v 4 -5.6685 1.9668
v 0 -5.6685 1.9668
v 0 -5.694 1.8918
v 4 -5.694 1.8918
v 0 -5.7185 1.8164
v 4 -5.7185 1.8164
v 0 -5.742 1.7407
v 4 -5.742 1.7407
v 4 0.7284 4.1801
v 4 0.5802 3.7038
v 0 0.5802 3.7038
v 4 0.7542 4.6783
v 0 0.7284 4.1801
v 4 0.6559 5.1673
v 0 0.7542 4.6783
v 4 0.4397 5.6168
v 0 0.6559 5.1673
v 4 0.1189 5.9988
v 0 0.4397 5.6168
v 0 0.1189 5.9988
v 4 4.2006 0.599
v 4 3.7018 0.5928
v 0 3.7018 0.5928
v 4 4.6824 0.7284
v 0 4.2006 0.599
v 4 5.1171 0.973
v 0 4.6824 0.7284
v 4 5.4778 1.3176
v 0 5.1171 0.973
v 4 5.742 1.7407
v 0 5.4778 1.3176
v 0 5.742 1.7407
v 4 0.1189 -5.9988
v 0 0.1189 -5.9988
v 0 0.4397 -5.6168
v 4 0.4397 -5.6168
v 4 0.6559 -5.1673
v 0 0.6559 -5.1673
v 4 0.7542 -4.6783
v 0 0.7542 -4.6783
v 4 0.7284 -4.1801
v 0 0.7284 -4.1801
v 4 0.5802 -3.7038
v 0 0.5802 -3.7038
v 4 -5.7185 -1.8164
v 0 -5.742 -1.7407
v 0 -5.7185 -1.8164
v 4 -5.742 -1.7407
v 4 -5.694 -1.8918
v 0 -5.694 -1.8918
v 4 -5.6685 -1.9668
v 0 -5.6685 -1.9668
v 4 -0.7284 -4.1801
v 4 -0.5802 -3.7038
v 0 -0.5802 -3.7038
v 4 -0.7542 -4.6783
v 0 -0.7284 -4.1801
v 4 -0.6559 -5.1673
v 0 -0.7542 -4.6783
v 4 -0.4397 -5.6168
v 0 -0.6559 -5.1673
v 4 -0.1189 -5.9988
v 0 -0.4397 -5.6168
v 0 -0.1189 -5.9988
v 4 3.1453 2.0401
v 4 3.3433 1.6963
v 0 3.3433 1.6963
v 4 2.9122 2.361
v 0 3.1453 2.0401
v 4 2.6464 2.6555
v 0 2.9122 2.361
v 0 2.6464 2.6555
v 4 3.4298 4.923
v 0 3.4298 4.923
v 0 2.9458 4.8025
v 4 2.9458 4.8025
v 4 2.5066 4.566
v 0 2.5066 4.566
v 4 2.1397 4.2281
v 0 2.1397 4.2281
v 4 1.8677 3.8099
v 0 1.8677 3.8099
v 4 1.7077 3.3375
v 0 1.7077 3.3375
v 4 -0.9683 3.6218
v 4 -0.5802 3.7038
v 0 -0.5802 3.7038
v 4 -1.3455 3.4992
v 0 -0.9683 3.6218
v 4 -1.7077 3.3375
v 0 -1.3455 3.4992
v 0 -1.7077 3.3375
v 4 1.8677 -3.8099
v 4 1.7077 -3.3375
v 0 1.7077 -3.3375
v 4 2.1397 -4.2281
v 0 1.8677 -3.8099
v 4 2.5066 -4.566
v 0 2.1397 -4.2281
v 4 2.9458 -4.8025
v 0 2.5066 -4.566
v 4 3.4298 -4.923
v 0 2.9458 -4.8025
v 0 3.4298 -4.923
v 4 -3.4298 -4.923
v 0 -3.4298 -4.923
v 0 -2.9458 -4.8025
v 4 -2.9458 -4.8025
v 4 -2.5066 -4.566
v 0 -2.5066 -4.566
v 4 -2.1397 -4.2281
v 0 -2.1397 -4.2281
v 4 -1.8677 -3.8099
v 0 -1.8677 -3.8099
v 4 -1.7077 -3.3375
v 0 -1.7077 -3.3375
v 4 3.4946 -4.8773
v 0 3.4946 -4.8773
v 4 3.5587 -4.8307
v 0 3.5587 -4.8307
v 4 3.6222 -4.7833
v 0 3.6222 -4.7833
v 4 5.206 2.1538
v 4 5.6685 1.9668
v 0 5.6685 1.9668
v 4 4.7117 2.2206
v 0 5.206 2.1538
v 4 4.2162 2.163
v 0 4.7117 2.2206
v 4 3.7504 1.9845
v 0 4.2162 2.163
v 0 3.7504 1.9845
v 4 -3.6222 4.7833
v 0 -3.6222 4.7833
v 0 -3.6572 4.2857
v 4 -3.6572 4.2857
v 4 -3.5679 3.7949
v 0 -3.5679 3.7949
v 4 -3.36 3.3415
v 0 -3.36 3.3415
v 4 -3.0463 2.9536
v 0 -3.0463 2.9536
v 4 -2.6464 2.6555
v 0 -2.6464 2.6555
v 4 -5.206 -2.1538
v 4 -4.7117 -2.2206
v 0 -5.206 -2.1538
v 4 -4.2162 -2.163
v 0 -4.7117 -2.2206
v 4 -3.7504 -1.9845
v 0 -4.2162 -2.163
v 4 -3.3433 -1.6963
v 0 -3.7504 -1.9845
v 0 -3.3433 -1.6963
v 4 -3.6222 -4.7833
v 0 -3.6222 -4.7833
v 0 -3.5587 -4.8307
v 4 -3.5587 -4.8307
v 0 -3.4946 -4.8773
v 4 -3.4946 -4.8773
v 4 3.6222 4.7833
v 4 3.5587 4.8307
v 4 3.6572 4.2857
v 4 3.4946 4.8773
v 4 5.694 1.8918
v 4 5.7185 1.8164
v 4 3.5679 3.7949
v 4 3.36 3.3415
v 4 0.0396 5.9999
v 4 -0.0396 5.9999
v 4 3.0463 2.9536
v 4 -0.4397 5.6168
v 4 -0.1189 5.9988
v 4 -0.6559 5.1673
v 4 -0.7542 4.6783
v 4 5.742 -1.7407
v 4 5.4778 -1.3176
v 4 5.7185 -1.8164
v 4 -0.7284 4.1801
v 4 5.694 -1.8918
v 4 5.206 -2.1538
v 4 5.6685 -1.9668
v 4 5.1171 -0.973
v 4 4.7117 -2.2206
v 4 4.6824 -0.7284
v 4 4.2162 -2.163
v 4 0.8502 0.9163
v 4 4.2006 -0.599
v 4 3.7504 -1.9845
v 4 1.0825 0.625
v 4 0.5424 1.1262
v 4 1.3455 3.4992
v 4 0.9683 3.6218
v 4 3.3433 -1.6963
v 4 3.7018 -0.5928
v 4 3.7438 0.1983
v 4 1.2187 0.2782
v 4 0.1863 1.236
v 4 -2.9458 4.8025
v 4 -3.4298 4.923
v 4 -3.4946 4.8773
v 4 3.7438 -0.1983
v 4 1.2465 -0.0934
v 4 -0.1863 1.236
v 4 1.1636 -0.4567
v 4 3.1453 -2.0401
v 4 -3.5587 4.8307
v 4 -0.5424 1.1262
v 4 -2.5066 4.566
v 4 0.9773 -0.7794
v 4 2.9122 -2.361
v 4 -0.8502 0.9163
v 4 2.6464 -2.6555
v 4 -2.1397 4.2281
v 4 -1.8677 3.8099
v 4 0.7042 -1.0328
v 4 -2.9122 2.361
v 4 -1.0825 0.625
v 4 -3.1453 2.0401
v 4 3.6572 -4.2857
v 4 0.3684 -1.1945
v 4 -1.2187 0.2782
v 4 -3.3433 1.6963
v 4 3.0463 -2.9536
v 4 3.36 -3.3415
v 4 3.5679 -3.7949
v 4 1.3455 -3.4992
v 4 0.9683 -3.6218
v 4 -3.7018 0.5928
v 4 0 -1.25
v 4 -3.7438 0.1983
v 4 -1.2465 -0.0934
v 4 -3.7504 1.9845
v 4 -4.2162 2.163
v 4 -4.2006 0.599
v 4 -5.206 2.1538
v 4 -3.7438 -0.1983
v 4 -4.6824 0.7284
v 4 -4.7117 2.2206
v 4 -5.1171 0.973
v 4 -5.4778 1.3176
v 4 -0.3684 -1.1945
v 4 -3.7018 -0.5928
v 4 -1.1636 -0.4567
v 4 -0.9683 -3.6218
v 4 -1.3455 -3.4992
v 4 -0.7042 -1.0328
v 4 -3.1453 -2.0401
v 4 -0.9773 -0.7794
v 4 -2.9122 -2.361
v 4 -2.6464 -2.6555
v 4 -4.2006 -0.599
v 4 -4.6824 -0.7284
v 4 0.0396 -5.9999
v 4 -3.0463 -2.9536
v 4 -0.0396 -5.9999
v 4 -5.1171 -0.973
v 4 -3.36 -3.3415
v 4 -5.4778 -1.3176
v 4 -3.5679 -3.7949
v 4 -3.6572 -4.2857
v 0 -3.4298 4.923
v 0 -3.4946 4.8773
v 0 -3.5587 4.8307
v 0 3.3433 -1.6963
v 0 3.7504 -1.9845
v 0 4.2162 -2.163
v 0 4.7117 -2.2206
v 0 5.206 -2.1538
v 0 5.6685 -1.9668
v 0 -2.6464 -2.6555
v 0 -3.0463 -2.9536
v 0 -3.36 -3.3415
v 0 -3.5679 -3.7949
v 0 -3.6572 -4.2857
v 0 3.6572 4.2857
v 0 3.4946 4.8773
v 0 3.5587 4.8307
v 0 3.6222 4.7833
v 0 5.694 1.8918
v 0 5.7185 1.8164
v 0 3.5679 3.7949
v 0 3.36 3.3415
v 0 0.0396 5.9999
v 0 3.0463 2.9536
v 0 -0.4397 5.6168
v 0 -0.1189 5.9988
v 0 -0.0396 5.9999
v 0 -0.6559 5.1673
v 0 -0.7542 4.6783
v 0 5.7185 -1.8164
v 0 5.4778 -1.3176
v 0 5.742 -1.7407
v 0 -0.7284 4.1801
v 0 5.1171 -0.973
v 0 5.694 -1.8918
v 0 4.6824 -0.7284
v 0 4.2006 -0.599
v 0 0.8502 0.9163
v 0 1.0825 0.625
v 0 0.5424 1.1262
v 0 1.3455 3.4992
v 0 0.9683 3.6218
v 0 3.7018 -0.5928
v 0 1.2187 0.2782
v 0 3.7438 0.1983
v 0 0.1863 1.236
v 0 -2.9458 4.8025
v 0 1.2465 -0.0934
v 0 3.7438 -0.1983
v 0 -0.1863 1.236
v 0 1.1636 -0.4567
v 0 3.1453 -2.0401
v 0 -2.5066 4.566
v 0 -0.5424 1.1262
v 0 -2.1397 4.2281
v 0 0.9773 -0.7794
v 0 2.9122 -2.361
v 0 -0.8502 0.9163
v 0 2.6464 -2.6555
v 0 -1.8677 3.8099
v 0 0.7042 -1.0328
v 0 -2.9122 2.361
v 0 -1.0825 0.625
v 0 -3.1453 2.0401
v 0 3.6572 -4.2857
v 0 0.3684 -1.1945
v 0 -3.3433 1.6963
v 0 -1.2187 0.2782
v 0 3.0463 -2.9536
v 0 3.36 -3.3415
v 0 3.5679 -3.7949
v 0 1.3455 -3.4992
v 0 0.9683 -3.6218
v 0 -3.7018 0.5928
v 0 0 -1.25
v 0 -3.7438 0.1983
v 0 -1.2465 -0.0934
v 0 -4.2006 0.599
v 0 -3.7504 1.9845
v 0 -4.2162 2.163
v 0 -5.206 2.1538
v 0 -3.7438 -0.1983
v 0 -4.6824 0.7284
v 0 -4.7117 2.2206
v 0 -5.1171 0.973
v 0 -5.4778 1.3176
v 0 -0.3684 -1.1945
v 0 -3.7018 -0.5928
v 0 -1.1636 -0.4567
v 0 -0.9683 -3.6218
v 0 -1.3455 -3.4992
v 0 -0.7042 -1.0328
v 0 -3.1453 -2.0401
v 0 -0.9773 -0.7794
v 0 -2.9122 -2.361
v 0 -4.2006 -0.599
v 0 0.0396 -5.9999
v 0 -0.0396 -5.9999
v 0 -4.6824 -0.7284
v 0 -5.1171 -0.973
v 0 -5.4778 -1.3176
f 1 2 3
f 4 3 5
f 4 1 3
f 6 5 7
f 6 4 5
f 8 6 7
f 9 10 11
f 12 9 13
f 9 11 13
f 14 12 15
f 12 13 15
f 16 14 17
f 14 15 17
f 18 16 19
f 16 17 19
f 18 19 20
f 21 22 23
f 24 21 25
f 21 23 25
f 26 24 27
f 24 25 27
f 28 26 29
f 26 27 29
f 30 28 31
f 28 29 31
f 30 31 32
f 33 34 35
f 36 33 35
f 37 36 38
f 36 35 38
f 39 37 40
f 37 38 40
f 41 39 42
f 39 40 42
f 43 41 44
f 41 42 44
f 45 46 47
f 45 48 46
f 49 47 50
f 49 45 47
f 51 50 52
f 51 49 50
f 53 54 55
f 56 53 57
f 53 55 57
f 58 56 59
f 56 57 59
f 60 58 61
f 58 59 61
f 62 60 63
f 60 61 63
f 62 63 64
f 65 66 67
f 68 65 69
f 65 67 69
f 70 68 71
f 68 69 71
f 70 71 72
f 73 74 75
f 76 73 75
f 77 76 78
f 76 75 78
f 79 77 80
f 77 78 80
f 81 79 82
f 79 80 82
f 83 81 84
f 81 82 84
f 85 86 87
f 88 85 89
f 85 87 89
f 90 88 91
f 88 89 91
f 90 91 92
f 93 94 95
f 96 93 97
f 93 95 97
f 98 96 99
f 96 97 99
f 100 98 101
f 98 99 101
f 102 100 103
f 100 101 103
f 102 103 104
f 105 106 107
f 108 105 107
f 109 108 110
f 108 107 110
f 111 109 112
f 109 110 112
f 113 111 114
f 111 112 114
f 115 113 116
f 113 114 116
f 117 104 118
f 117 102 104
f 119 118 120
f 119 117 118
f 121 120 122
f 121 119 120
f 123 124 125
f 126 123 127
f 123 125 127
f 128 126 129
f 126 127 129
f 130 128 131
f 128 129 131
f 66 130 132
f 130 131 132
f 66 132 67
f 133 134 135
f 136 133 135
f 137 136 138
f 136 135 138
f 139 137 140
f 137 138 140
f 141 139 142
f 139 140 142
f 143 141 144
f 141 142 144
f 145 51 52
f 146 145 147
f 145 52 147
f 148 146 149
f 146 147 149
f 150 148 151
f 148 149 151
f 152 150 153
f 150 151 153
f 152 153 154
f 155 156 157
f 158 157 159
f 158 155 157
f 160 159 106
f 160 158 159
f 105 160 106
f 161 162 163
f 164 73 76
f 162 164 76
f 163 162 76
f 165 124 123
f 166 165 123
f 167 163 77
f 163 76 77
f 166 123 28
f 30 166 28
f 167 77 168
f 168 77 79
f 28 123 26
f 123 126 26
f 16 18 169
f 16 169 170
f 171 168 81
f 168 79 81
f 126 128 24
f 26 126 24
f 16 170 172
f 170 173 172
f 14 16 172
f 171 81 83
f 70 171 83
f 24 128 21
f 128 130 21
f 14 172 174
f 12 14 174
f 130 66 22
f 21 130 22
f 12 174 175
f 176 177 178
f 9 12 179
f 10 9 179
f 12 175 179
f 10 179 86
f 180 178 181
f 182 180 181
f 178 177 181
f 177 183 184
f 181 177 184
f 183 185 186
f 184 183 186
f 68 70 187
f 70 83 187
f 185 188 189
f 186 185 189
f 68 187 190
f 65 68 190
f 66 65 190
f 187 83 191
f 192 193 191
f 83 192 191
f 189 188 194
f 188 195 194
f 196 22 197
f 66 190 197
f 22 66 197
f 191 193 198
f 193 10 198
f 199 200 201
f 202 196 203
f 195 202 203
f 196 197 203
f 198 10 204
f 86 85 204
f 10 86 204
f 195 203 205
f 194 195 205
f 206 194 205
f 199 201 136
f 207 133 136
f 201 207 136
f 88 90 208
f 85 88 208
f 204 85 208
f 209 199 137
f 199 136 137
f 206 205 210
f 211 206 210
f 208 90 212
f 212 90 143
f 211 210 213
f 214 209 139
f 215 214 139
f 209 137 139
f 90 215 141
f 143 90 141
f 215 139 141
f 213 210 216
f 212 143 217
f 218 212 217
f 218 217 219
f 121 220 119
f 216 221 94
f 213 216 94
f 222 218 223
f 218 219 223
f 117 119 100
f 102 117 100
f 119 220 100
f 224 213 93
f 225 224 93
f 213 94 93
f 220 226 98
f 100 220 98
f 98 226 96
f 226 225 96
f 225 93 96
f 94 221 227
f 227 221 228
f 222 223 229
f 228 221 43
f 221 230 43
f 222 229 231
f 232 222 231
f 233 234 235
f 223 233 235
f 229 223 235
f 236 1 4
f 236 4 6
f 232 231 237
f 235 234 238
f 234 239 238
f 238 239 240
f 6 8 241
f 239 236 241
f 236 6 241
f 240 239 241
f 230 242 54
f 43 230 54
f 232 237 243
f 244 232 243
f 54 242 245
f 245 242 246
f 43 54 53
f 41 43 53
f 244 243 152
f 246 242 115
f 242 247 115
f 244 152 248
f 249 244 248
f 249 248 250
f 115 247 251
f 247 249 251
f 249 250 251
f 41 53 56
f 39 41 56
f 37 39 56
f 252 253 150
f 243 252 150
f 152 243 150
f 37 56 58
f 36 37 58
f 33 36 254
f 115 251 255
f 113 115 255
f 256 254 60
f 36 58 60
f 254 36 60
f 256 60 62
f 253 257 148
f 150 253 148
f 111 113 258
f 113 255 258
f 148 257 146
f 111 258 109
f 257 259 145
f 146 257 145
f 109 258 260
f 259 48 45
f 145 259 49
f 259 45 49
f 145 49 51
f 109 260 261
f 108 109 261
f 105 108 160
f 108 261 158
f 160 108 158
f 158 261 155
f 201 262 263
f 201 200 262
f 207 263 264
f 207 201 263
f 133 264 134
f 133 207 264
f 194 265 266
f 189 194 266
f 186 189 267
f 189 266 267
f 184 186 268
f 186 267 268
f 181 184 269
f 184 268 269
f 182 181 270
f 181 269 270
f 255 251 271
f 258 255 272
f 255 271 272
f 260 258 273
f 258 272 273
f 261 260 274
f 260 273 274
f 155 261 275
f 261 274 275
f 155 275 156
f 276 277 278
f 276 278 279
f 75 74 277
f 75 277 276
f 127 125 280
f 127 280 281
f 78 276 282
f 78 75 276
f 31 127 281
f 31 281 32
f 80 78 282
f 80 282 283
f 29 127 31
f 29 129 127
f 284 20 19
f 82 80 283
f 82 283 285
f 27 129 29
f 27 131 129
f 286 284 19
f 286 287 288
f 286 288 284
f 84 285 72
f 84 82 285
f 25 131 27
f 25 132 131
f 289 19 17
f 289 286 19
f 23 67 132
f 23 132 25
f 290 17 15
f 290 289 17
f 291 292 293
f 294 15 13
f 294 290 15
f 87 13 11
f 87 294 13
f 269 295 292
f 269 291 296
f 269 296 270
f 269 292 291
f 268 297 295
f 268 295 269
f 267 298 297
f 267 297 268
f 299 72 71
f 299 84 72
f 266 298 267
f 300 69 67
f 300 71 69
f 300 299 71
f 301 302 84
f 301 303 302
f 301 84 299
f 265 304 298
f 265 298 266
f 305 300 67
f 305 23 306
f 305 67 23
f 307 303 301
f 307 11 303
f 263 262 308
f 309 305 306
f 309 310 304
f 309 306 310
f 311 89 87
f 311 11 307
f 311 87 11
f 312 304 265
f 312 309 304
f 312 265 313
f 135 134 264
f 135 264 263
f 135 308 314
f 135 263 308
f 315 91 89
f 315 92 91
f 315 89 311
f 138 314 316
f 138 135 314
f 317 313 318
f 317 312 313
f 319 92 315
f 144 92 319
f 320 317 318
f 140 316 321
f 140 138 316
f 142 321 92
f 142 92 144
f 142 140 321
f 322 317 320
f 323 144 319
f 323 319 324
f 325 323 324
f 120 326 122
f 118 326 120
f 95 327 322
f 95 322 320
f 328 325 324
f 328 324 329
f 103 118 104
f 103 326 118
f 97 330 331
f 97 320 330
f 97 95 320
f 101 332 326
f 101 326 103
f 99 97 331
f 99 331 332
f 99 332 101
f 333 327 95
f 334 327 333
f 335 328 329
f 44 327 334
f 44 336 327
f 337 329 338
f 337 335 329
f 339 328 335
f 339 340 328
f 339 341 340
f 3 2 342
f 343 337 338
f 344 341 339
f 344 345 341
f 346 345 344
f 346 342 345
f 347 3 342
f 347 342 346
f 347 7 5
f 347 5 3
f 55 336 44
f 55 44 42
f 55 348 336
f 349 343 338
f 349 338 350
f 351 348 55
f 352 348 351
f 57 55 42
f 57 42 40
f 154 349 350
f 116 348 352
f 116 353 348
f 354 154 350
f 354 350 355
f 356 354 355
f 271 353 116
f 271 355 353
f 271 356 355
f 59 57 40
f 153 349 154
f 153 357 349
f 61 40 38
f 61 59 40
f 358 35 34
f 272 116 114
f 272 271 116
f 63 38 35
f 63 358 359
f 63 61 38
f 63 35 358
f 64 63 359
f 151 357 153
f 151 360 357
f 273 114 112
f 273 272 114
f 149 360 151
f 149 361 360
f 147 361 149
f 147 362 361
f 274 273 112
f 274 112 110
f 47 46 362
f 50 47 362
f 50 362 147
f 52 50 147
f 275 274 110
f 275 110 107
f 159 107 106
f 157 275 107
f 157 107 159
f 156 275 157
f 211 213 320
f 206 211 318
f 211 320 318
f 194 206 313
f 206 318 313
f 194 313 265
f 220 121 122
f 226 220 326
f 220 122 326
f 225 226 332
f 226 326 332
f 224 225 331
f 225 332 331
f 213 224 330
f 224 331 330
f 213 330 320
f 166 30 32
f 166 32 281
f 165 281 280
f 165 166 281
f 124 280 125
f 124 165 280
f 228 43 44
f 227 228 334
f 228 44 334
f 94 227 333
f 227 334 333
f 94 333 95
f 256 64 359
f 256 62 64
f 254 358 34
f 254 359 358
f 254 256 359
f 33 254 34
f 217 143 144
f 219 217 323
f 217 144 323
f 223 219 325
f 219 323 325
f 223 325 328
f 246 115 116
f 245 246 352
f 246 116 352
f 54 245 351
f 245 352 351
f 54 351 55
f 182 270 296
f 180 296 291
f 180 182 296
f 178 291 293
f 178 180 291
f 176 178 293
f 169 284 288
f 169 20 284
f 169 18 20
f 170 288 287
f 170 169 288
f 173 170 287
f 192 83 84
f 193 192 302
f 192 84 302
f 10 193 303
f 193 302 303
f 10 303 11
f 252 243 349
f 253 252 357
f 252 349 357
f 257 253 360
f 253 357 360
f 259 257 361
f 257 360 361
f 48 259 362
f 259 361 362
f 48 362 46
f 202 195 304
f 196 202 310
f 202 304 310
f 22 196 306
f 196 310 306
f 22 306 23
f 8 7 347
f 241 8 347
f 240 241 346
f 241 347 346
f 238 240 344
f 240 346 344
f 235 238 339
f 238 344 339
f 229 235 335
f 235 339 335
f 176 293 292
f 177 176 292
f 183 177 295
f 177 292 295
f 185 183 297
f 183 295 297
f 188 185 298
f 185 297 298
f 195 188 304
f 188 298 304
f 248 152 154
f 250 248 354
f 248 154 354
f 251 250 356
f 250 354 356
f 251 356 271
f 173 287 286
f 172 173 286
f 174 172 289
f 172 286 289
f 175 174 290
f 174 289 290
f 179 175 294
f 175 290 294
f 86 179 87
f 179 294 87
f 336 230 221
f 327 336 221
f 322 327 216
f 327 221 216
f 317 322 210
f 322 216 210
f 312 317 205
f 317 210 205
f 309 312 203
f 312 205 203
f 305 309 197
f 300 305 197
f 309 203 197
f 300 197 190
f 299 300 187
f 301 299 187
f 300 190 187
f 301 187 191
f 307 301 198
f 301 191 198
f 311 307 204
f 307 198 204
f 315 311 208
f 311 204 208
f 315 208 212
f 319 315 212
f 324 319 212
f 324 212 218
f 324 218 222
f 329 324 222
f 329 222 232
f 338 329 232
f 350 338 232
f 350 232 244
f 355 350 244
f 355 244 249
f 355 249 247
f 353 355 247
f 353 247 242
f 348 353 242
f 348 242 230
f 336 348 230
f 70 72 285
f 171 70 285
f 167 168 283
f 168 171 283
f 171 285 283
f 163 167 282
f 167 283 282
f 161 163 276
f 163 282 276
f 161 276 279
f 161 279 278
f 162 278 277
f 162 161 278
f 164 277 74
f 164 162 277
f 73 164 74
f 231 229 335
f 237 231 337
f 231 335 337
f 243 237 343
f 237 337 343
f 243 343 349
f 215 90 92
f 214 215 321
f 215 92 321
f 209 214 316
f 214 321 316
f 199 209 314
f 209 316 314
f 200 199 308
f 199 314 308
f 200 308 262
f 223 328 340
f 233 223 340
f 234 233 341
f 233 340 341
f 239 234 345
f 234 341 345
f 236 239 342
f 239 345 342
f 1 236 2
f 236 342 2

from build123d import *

# Parameters (mm, degrees)
BASPROSKE_W         = 4
BASPROSKE_H         = 6
TOOTHCUT_DEPTH      = 10.38083152
TEETHCUTS_COUNT     = 10
BORSKE_R            = 1
BORE_DEPTH          = 50.0000508
SKETCH_1_R          = 1.25
CUT_EXTRUDE_1_DEPTH = 10


with BuildPart() as part:
    # BasProSke → Base-Revolve (revolve)
    with BuildSketch(Plane(origin=(0, 0, 0), x_dir=(1, 0, 0), z_dir=(0, 1, 0)), mode=Mode.PRIVATE) as base_revolve_sk:
        with Locations((2, 3)):
            Rectangle(BASPROSKE_W, BASPROSKE_H)
    revolve(base_revolve_sk.sketch.rotate(Axis((-10, 0, 0), (1, 0, 0)), 180), axis=Axis((-10, 0, 0), (1, 0, 0)))

    # TooCutSke → ToothCut (cut, through all)
    with BuildSketch(Plane(origin=(0, 0, 0), x_dir=(0, 0, -1), z_dir=(1, 0, 0))):
        with BuildLine():
            ThreePointArc((0.59278292, 3.701838653), (0, 3.749), (-0.59278292, 3.701838653))
            ThreePointArc((-0.59278292, 3.701838653), (-0.846593509, 4.924114224), (-1.775771316, 5.757784417))
            ThreePointArc((-1.775771316, 5.757784417), (0, 6.0254), (1.775771316, 5.757784417))
            ThreePointArc((1.775771316, 5.757784417), (0.846593509, 4.924114224), (0.59278292, 3.701838653))
        make_face()
    toothcut = extrude(amount=TOOTHCUT_DEPTH, mode=Mode.SUBTRACT)

    # TeethCuts: ToothCut ×10 about axis
    teethcuts_axis = Axis((0, 0, 0), (1, 0, 0))
    for i in range(1, TEETHCUTS_COUNT):
        add(toothcut.rotate(teethcuts_axis, i * 360 / TEETHCUTS_COUNT), mode=Mode.SUBTRACT)

    # BorSke → Bore (cut, symmetric)
    with BuildSketch(Plane(origin=(0, 0, 0), x_dir=(0, 0, -1), z_dir=(1, 0, 0))):
        with Locations(Location((0, 0, 0), (0, 0, 180))):
            Circle(BORSKE_R)
    extrude(amount=BORE_DEPTH, both=True, mode=Mode.SUBTRACT)

    # 草图1 → 切除-拉伸1 (cut)
    with BuildSketch(Plane(origin=(4, 0, 0), x_dir=(0, 0, -1), z_dir=(1, 0, 0))):
        Circle(SKETCH_1_R)
    extrude(amount=-CUT_EXTRUDE_1_DEPTH, mode=Mode.SUBTRACT)


solid = part.part
